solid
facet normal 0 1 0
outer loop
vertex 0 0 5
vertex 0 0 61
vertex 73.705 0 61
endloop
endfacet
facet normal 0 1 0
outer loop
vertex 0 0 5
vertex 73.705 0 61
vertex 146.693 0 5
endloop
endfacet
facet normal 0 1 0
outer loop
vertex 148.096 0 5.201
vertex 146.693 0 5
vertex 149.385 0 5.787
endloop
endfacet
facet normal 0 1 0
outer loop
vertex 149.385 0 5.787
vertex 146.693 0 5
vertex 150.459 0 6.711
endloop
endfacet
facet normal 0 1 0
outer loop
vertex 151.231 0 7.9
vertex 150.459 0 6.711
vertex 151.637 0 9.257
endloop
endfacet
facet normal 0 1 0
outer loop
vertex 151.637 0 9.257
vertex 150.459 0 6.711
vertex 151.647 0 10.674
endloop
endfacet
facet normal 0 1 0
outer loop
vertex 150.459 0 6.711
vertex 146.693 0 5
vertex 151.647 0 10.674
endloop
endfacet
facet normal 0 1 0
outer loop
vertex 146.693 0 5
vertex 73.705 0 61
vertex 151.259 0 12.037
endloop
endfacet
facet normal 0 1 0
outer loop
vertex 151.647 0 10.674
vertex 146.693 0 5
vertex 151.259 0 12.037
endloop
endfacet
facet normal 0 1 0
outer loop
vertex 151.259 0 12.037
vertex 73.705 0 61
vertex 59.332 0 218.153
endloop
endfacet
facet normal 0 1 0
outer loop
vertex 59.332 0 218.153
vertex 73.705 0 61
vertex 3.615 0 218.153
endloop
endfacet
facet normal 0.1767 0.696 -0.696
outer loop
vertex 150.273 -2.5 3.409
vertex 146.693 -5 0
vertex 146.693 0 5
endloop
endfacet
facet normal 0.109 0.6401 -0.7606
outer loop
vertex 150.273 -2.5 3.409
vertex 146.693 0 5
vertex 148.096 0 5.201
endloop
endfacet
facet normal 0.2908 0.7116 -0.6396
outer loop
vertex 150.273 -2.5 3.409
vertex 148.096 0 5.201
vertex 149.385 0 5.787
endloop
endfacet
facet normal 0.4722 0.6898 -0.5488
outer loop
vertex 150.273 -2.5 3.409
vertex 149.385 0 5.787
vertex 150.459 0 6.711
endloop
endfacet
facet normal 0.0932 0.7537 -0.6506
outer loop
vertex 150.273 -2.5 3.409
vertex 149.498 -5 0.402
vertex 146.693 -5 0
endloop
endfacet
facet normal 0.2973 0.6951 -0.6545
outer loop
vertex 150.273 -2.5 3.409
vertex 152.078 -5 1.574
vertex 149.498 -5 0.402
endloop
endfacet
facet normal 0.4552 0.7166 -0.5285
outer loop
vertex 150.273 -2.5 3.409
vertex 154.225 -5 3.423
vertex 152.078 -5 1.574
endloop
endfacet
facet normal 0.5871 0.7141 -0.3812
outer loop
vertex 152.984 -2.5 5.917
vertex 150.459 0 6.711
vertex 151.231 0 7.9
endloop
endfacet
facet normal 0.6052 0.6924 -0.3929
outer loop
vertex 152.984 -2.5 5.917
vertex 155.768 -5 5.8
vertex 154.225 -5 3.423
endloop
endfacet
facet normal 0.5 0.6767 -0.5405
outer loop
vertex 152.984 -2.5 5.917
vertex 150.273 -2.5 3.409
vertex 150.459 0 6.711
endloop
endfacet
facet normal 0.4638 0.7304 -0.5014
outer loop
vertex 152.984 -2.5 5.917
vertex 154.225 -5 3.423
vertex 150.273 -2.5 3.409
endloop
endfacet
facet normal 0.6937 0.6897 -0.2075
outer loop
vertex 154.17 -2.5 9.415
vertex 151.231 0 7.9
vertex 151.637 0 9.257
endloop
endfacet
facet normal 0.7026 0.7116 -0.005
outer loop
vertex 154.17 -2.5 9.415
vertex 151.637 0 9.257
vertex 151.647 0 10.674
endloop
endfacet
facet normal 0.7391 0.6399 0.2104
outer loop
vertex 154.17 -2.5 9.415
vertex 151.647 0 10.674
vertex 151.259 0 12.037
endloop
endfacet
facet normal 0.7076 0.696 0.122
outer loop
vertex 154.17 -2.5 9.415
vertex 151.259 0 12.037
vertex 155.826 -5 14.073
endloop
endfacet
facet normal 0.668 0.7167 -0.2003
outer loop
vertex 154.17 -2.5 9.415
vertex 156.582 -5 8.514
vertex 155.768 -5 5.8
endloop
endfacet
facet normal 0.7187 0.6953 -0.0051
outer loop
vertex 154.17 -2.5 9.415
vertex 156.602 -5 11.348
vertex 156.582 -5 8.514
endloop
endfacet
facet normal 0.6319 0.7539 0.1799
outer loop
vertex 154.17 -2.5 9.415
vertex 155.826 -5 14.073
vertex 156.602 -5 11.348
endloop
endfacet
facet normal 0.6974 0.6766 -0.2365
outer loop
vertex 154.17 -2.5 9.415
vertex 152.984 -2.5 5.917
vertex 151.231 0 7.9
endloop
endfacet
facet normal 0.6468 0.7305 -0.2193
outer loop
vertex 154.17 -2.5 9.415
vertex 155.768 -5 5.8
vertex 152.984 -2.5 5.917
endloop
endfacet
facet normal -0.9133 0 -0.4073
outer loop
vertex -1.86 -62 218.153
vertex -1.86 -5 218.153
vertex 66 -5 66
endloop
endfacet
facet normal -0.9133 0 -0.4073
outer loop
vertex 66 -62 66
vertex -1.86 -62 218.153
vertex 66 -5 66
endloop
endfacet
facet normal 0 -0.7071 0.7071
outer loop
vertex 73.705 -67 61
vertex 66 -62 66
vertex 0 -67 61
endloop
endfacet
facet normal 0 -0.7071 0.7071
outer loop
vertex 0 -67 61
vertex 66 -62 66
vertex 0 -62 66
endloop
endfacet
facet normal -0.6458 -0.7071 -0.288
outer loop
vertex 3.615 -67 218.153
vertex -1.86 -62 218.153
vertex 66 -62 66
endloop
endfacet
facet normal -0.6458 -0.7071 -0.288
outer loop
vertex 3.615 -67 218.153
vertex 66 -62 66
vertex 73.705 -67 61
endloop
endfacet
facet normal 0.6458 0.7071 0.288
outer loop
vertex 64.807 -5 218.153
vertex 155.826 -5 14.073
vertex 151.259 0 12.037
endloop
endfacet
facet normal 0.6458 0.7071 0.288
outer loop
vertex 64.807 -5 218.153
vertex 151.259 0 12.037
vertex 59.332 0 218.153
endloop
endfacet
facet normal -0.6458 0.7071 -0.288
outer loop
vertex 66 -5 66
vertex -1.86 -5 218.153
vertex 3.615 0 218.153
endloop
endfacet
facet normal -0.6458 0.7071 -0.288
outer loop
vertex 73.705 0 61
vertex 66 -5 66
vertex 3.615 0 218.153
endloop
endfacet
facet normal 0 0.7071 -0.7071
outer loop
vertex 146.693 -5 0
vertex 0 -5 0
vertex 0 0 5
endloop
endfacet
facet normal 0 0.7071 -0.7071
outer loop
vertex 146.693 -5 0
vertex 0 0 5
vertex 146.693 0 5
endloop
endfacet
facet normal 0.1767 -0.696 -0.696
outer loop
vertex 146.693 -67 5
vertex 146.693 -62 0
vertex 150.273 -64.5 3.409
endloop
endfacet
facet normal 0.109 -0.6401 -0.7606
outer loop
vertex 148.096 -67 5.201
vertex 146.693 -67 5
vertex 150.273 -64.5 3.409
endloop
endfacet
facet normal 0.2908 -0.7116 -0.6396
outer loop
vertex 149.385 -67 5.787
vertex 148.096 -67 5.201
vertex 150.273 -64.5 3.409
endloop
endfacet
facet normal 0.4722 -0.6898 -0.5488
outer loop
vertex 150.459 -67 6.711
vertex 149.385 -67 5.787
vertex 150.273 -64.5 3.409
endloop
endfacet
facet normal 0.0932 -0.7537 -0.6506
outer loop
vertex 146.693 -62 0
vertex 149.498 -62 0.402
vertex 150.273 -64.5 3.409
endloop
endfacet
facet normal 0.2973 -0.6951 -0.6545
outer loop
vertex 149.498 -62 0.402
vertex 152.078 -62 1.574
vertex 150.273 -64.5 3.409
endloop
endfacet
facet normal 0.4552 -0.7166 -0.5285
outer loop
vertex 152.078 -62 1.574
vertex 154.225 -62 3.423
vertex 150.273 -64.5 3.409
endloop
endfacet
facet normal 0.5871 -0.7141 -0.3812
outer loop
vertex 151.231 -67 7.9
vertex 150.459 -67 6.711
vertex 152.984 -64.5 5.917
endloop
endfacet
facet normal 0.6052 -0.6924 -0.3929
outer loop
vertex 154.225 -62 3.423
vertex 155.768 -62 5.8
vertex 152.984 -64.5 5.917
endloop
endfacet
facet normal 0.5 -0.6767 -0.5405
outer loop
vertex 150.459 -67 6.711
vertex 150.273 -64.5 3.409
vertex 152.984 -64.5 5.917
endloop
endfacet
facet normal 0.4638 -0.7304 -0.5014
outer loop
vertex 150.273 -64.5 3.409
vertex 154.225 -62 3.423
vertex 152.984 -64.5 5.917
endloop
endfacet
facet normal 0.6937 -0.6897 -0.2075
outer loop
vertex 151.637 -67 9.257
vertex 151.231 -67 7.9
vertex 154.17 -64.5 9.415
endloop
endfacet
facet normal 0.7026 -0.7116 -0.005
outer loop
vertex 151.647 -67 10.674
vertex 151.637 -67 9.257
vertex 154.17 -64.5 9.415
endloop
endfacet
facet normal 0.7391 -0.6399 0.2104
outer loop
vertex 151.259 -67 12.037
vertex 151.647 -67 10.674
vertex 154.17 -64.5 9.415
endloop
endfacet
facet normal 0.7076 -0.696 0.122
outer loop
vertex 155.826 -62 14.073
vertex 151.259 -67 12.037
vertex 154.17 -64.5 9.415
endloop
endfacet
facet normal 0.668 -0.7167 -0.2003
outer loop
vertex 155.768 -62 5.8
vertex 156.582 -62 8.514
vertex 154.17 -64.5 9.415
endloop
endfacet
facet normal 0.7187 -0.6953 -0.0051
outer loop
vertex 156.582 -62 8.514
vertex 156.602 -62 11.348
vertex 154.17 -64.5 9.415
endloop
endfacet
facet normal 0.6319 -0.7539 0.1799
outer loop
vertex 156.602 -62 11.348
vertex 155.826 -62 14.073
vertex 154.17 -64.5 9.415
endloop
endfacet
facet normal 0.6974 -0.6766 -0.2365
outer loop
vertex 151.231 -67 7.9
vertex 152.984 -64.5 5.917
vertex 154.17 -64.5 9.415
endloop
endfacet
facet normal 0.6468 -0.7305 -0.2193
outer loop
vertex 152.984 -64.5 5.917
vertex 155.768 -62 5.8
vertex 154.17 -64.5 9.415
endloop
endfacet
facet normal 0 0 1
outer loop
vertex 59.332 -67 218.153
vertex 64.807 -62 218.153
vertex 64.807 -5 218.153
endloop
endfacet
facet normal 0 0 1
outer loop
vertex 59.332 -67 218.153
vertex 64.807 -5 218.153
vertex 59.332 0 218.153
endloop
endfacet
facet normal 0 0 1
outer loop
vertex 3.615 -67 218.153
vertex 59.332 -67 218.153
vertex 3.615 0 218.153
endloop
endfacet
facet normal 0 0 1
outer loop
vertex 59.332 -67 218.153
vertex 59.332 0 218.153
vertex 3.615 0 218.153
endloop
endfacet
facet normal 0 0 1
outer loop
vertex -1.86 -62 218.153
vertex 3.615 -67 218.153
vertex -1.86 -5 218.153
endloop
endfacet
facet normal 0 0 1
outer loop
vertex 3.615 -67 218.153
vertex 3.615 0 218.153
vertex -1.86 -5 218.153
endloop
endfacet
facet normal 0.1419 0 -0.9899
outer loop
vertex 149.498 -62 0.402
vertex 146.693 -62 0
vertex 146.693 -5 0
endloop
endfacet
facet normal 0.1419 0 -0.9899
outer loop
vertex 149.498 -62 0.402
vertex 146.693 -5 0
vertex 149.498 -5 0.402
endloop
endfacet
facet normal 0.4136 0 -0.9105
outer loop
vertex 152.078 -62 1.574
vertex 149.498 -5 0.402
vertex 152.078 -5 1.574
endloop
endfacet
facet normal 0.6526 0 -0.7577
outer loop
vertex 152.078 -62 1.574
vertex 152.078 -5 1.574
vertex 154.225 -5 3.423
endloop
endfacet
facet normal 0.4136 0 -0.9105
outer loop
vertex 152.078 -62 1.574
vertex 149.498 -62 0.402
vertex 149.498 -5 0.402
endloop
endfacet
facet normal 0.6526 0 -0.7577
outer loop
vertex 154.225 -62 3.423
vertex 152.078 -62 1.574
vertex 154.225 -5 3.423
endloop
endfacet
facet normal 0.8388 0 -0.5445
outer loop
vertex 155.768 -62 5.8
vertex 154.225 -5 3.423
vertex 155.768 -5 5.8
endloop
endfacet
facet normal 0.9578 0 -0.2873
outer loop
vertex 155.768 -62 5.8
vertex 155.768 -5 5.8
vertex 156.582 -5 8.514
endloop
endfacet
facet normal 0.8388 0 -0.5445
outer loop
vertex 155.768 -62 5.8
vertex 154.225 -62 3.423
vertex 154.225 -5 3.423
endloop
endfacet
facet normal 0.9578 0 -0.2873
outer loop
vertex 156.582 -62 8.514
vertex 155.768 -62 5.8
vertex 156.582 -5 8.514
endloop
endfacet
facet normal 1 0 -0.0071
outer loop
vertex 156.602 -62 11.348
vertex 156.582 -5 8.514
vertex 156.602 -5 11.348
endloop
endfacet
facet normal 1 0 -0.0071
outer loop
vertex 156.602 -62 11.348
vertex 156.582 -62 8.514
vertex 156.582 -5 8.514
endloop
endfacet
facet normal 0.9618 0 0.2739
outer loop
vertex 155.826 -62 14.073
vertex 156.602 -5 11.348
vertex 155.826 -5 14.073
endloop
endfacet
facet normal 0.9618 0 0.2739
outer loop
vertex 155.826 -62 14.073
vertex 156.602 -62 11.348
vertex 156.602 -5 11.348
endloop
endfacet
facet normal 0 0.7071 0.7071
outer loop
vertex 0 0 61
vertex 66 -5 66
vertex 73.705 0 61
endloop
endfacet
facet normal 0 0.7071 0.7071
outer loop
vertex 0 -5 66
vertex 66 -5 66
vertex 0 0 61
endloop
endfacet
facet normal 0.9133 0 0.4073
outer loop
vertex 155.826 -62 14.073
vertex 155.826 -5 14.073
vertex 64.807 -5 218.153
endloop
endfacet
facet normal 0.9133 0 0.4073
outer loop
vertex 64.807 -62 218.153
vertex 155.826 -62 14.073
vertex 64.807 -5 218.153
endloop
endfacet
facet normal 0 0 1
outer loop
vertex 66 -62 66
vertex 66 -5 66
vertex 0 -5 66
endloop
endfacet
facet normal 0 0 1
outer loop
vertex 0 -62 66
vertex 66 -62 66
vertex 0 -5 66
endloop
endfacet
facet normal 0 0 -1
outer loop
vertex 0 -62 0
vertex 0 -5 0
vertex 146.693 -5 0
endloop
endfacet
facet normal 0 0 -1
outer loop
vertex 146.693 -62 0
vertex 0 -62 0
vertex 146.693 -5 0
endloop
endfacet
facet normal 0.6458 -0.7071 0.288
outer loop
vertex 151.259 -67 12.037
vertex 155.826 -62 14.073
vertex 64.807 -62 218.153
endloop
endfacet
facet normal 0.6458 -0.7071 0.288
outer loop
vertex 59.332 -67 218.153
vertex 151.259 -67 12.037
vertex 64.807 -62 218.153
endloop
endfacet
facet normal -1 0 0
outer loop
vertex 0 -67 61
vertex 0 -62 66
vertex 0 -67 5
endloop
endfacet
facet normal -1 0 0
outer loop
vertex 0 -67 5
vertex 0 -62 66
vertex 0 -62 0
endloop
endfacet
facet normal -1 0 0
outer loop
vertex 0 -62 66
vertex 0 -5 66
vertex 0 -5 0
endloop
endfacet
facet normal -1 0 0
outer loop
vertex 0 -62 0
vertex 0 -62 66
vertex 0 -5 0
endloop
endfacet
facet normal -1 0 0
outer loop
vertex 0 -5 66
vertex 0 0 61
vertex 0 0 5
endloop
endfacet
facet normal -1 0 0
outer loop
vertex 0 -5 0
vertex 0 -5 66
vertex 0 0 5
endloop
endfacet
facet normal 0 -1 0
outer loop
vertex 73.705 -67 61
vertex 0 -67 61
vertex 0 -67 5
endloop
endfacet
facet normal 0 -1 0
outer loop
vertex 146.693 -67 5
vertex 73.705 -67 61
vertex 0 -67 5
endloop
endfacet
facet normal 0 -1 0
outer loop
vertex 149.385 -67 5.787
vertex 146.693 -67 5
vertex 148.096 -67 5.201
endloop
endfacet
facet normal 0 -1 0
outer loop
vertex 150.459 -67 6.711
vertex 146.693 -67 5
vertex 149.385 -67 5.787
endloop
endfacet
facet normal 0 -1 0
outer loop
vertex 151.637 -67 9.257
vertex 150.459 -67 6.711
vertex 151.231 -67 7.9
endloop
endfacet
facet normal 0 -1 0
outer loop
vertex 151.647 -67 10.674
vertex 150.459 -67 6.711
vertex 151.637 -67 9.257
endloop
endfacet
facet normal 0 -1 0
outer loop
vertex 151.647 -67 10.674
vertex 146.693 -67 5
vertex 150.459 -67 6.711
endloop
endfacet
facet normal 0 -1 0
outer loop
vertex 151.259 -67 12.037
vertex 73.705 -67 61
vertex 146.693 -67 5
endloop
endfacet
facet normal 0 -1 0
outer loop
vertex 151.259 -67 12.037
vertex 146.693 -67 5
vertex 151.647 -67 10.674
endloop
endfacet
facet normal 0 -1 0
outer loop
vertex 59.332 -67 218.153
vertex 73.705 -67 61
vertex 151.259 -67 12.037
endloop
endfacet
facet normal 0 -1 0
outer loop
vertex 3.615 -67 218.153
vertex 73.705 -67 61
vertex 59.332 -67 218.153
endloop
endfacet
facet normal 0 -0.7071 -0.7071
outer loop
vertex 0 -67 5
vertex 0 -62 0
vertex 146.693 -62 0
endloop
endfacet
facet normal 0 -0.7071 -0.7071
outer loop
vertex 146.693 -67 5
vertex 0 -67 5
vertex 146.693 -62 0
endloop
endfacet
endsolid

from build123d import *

# Parameters (mm, degrees)
F1_DEPTH = 67
F2_R     = 10
F3_SIZE  = 5


with BuildPart() as f1:
    # F0 (on Front) → F1 (new body)
    with BuildSketch(Plane.XZ):
        Polygon((66, 66), (0, 66), (0, 0), (162.102426, 0), (64.806874, 218.153241), (-1.859792, 218.153241), align=None)
    extrude(amount=F1_DEPTH)

    # F2
    f2_edges = [f1.edges().sort_by_distance(p)[0] for p in [
        (162.102426, -33.5, 0),
    ]]
    fillet(f2_edges, radius=F2_R)

    # F3
    f3_edges = [f1.edges().sort_by_distance(p)[0] for p in [
        (110.316348, -67, 116.113229),
        (110.316348, 0, 116.113229),
        (32.070104, -67, 142.07662),
        (32.070104, 0, 142.07662),
        (33, 0, 66),
        (33, -67, 66),
    ]]
    chamfer(f3_edges, length=F3_SIZE)


solid = f1.part
